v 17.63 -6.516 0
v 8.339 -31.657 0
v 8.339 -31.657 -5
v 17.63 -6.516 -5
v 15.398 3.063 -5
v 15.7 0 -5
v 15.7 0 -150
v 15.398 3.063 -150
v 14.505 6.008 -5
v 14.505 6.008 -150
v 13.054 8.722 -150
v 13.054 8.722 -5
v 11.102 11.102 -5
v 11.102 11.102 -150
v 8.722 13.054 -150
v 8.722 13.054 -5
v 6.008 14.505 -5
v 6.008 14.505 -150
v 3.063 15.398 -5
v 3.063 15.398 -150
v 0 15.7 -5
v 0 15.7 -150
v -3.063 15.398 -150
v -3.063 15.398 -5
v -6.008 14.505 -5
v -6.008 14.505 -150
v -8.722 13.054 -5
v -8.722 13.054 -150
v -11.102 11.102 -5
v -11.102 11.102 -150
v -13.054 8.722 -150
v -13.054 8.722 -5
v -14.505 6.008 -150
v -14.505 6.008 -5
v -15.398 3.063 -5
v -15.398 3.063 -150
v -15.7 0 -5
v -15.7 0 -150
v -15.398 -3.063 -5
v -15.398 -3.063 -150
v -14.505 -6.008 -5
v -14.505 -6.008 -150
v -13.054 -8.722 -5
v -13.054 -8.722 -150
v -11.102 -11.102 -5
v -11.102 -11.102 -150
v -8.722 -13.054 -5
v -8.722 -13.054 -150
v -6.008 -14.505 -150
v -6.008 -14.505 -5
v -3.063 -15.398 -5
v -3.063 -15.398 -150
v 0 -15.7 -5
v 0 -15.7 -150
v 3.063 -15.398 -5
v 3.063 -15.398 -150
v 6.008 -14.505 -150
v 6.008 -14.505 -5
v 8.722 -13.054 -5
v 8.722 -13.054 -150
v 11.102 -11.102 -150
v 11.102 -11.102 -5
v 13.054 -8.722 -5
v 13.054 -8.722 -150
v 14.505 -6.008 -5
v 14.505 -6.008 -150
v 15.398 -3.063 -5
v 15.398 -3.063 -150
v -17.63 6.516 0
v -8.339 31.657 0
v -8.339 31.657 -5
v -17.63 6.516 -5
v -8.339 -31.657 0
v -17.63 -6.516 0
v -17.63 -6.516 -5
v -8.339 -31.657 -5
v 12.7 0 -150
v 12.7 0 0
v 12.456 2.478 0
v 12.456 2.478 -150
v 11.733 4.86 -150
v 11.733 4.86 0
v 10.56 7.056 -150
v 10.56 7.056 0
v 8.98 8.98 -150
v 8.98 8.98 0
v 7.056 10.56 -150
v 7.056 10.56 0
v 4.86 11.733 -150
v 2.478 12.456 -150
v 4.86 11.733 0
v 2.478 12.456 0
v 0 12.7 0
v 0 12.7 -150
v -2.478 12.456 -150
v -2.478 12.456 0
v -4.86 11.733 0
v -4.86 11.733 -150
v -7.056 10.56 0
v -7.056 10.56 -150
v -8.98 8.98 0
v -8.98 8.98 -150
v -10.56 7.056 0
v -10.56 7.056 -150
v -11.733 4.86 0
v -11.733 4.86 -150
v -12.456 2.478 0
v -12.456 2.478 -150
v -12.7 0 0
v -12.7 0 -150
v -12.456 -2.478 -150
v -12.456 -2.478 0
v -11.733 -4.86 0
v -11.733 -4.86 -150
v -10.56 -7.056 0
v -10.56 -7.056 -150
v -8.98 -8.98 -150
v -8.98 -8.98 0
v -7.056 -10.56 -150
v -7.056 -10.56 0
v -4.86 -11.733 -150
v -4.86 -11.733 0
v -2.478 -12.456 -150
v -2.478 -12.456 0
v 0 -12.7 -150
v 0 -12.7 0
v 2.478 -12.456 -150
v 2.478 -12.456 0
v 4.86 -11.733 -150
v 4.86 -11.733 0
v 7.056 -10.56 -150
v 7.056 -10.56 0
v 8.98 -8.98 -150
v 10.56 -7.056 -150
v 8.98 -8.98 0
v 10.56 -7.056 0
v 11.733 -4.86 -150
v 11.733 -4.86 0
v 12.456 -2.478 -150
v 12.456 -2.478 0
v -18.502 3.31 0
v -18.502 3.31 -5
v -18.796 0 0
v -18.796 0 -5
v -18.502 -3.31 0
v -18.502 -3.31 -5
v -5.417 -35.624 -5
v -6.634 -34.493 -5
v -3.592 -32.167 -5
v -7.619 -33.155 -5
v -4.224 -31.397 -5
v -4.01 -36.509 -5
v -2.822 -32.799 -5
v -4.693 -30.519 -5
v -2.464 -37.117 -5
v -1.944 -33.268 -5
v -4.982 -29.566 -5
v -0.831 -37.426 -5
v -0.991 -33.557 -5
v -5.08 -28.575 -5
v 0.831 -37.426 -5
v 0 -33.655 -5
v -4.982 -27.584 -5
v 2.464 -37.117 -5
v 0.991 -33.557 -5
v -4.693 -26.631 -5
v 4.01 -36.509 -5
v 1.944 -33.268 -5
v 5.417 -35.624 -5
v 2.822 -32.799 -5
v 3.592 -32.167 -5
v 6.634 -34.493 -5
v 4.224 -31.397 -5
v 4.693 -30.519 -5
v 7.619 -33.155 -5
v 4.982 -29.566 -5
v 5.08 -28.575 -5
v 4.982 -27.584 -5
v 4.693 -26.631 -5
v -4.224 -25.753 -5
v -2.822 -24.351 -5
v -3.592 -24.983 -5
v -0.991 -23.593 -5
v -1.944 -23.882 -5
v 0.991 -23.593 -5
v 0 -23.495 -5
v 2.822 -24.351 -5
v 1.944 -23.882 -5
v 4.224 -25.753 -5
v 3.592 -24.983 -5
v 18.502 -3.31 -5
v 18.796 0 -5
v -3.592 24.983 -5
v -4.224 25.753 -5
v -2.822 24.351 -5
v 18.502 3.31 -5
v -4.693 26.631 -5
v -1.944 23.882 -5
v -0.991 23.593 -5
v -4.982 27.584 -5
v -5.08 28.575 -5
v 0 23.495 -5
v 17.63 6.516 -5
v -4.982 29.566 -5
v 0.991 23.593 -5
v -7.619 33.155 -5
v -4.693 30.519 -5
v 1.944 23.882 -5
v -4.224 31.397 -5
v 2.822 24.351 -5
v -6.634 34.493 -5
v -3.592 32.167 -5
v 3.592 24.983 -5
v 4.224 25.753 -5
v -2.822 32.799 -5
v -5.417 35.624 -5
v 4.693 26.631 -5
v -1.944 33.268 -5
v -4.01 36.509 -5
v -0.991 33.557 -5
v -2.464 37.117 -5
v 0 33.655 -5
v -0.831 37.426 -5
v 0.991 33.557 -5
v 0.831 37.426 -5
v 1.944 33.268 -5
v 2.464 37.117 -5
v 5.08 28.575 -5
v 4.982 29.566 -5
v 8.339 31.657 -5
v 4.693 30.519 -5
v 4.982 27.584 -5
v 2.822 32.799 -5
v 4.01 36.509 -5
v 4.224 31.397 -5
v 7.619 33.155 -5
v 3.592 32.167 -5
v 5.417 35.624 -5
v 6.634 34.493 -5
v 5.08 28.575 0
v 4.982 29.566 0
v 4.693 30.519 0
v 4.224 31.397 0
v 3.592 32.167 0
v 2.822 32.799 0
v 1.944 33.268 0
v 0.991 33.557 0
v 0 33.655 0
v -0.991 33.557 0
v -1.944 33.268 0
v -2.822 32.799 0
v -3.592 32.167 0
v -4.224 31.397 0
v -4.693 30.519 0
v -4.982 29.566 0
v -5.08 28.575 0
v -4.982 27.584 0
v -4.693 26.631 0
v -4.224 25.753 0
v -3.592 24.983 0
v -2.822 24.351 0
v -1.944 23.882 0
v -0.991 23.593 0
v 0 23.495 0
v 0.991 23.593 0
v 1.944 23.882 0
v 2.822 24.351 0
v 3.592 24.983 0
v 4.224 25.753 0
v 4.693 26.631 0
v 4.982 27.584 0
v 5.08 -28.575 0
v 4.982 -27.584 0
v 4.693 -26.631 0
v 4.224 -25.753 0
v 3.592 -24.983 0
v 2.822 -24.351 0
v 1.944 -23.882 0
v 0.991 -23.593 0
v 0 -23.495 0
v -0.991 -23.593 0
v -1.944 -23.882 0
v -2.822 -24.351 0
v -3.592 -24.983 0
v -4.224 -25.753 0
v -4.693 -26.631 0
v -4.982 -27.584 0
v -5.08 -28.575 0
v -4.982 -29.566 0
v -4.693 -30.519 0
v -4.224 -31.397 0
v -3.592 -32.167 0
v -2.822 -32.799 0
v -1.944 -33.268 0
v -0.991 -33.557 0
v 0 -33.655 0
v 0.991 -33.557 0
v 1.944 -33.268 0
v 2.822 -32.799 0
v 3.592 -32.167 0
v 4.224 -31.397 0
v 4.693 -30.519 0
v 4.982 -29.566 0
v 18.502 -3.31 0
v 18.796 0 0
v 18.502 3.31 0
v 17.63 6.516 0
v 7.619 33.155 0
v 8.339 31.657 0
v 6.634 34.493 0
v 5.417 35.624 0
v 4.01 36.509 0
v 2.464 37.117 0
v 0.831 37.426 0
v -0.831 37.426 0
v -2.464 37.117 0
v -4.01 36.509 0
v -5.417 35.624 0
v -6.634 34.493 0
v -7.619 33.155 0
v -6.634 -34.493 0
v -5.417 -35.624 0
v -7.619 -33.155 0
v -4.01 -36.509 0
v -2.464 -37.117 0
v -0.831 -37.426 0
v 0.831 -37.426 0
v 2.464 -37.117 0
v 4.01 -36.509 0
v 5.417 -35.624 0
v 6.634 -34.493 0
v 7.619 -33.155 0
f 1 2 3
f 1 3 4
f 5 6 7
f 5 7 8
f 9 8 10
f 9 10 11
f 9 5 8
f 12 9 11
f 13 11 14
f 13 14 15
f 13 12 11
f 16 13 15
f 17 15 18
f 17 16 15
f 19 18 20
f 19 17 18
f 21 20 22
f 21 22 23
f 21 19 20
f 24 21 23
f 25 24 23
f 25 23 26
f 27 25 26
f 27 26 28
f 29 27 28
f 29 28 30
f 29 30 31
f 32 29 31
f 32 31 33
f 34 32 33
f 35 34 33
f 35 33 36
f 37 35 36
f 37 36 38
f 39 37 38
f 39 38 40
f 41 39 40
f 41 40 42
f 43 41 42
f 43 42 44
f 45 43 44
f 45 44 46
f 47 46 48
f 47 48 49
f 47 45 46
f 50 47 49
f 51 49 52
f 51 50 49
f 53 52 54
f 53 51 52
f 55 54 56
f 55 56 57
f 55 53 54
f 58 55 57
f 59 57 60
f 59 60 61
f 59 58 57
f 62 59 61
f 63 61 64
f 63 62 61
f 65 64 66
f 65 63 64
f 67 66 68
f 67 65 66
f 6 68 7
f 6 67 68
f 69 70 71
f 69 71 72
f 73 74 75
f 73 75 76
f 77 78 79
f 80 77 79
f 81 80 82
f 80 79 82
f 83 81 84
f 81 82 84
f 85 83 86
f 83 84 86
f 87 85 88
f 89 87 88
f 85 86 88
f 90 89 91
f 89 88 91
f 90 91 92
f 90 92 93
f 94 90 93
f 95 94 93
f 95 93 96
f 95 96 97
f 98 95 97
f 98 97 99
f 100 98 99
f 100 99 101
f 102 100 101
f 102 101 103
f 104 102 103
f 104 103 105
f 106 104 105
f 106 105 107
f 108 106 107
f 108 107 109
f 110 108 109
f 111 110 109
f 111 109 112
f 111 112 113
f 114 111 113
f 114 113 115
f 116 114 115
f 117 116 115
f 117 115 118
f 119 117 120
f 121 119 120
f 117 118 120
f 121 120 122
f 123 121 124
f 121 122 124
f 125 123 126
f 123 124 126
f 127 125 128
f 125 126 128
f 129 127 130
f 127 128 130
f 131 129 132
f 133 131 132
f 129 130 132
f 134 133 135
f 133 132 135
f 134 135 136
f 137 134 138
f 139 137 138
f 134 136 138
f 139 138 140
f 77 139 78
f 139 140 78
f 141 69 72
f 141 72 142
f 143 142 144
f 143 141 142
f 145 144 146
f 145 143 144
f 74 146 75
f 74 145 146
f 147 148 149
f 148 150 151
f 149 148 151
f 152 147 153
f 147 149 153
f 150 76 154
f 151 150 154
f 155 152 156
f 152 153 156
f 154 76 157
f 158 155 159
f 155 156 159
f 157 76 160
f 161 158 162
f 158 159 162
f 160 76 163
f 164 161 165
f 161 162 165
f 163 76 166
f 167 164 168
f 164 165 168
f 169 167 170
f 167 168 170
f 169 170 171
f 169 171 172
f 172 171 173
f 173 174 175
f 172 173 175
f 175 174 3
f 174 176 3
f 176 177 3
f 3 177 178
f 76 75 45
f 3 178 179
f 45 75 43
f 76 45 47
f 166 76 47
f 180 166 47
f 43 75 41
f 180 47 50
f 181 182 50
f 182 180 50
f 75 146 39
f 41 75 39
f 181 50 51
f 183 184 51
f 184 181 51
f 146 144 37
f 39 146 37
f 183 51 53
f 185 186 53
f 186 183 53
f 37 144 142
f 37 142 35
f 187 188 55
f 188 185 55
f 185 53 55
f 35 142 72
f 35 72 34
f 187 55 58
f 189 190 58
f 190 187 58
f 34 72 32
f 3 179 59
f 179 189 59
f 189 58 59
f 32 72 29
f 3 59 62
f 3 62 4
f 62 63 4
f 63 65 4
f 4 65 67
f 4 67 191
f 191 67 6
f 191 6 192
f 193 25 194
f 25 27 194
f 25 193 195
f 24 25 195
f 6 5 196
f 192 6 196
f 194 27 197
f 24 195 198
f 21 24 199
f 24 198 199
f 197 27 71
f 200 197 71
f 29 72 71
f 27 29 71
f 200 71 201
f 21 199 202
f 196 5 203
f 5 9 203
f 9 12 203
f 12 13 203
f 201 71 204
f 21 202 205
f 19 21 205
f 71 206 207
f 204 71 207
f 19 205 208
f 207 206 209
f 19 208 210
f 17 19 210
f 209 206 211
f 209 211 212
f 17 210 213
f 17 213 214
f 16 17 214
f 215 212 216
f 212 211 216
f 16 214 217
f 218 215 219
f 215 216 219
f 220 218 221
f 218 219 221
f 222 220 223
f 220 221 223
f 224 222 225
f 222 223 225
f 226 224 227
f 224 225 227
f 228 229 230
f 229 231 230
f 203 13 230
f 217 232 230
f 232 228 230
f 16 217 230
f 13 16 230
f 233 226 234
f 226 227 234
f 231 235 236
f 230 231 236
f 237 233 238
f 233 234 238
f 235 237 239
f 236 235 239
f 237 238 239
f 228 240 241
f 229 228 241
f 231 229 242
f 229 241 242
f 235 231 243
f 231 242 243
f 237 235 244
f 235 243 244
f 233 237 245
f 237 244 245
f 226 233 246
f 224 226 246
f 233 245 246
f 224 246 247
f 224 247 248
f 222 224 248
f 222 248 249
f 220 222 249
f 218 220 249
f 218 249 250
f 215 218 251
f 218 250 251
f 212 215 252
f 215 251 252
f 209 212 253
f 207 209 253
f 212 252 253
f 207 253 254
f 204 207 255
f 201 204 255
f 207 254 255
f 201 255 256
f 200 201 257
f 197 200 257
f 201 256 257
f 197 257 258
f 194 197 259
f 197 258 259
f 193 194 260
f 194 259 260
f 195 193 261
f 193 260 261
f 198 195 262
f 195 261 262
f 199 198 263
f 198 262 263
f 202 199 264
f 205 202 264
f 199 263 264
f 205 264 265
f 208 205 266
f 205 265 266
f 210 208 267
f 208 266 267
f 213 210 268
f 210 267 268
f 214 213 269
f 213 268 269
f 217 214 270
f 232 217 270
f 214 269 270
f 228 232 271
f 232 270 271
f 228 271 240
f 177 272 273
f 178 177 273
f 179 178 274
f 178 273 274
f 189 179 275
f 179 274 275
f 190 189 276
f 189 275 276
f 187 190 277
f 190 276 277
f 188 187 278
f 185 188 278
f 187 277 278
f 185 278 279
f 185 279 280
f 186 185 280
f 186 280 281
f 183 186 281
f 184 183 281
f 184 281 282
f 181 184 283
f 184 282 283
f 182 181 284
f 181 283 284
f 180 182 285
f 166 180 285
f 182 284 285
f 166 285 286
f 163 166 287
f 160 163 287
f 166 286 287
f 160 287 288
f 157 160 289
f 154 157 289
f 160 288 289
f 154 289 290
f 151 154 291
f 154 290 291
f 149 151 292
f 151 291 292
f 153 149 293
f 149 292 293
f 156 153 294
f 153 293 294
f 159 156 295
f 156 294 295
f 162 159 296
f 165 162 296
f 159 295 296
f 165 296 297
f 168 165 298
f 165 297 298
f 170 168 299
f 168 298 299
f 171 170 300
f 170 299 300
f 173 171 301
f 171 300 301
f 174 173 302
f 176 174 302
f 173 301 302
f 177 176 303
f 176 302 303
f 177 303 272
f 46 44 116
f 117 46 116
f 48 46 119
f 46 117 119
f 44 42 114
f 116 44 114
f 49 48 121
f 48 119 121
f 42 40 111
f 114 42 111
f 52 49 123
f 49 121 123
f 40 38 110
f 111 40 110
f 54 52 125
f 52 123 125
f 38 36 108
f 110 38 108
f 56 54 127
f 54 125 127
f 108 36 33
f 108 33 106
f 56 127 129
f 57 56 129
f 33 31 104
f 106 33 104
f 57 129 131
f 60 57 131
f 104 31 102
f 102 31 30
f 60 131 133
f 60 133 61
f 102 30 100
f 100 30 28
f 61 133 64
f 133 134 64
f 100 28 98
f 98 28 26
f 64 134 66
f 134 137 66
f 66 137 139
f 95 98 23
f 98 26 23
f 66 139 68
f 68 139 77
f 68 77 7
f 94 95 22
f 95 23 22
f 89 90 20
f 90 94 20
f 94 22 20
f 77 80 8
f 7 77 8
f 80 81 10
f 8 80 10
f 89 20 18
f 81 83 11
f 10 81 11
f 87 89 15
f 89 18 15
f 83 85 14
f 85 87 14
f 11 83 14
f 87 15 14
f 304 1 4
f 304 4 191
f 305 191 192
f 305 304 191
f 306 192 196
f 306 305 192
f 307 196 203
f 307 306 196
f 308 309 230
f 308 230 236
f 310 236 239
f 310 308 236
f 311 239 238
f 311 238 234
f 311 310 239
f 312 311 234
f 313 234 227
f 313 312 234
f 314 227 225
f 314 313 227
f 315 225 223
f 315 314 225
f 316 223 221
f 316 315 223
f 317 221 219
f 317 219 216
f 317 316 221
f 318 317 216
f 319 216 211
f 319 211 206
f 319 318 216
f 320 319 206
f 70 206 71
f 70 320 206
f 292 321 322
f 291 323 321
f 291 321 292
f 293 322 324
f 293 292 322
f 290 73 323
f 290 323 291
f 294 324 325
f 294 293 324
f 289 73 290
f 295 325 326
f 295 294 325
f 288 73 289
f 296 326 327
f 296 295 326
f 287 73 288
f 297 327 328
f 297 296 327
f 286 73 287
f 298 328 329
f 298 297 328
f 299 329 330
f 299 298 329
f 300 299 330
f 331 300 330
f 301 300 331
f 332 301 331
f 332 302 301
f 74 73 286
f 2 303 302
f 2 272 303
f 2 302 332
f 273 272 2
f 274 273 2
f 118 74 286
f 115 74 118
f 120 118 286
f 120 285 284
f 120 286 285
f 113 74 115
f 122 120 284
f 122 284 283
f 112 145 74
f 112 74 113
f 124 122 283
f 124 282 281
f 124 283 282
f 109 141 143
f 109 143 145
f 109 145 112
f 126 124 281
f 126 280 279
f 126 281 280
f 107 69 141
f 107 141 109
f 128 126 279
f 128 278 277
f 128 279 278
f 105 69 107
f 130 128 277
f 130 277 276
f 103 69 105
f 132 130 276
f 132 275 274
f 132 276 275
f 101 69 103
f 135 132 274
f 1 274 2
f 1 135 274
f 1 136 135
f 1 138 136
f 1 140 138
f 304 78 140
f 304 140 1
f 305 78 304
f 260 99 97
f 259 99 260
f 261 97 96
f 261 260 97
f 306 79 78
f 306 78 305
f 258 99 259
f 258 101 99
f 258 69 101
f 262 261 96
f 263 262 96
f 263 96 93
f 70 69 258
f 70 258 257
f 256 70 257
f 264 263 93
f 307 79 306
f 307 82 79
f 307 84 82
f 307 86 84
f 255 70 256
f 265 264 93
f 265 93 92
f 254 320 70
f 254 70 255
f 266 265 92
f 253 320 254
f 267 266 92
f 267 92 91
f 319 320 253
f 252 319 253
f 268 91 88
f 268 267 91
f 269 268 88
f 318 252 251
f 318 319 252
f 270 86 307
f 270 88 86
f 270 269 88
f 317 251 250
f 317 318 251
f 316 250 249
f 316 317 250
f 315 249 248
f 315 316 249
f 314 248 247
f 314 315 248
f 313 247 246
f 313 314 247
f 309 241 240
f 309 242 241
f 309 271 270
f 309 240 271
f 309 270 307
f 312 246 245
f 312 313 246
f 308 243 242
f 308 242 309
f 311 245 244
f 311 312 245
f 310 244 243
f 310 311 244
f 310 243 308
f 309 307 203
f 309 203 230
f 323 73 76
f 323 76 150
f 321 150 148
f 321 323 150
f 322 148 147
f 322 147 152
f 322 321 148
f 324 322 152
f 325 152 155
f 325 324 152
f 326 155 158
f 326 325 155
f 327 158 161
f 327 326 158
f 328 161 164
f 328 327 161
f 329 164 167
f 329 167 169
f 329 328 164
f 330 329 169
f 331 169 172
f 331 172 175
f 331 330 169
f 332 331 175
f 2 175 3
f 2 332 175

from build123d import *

# Parameters (mm, degrees)
SKETCH1_R           = 5.08
SKETCH1_R_2         = 12.7
BOSS_EXTRUDE1_DEPTH = 5
SKETCH2_R           = 15.7
SKETCH2_R_2         = 12.7
BOSS_EXTRUDE2_DEPTH = 150


with BuildPart() as part:
    # Sketch1 → Boss-Extrude1 (new body)
    with BuildSketch(Plane.XY):
        with BuildLine():
            Line((17.630429803, 6.515946667), (8.338716799, 31.656866667))
            ThreePointArc((8.338716799, 31.656866667), (0, 37.465), (-8.338716799, 31.656866667))
            Line((-8.338716799, 31.656866667), (-17.630429803, 6.515946667))
            ThreePointArc((-17.630429803, 6.515946667), (-18.796, 0), (-17.630429803, -6.515946667))
            Line((-17.630429803, -6.515946667), (-8.338716799, -31.656866667))
            ThreePointArc((-8.338716799, -31.656866667), (0, -37.465), (8.338716799, -31.656866667))
            Line((8.338716799, -31.656866667), (17.630429803, -6.515946667))
            ThreePointArc((17.630429803, -6.515946667), (18.796, 0), (17.630429803, 6.515946667))
        make_face()
        with Locations((0, 28.575)):
            Circle(SKETCH1_R, mode=Mode.SUBTRACT)
        Circle(SKETCH1_R_2, mode=Mode.SUBTRACT)
        with Locations((0, -28.575)):
            Circle(SKETCH1_R, mode=Mode.SUBTRACT)
    extrude(amount=-BOSS_EXTRUDE1_DEPTH)

    # Sketch2 → Boss-Extrude2 (add)
    with BuildSketch(Plane.XY):
        Circle(SKETCH2_R)
        Circle(SKETCH2_R_2, mode=Mode.SUBTRACT)
    extrude(amount=-BOSS_EXTRUDE2_DEPTH)


solid = part.part
